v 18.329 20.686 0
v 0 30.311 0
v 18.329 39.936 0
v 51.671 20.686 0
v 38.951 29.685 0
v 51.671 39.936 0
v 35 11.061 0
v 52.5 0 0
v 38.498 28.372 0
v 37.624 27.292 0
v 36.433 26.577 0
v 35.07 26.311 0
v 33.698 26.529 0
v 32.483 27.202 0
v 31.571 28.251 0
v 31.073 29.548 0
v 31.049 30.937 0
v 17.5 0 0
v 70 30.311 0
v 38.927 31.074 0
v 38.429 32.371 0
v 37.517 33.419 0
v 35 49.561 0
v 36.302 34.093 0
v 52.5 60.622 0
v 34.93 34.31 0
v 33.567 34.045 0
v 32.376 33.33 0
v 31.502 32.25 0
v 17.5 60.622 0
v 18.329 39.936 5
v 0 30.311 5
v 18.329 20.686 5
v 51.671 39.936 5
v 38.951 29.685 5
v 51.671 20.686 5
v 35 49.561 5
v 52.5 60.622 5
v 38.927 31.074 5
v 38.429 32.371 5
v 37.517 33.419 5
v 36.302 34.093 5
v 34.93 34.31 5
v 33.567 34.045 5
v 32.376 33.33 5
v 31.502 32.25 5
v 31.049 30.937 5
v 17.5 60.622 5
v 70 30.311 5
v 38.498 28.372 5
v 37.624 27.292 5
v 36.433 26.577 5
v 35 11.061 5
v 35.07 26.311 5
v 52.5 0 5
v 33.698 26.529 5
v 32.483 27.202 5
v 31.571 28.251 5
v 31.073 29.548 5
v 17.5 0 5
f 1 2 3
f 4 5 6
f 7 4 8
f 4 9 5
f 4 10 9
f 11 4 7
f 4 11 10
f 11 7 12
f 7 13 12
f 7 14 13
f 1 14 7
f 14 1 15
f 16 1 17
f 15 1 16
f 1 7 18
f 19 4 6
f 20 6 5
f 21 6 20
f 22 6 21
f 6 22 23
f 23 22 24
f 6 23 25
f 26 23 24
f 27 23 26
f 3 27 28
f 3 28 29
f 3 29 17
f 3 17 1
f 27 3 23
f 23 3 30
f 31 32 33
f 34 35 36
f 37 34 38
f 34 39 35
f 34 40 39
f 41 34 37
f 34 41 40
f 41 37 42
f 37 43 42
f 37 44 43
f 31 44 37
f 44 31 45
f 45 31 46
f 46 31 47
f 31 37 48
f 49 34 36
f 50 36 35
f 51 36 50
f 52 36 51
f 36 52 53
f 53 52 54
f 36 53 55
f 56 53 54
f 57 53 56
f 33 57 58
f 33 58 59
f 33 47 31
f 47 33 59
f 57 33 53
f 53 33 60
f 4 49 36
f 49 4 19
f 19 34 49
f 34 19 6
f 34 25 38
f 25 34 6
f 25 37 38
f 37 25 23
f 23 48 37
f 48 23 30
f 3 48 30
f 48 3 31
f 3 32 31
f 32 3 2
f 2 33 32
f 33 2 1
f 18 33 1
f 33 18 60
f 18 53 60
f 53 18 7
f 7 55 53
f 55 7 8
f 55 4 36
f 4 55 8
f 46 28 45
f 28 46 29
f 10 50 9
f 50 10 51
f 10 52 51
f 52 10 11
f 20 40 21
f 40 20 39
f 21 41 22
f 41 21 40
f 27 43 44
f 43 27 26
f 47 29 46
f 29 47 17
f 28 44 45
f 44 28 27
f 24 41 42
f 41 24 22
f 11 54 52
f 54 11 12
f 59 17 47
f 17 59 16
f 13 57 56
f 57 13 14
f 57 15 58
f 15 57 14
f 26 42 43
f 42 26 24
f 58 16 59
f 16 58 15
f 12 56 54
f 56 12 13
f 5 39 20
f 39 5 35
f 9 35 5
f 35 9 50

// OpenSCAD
$fn = 32;

// ----------------------------------------------------------------------
// Star wheel: 6-point star, R35
// ----------------------------------------------------------------------

// --- parameters (mm) ---
n_points = 6;             // number of points / teeth
r_out = 35;               // tip radius
r_in = 19.25;             // root radius
bore_r = 4;               // centre bore radius
plate_t = 5;              // plate thickness, Z (extrusion height)
bore_d = 8;               // centre bore diameter

profile = [[0, 30.311], [18.329, 20.686], [17.5, 0], [35, 11.061], [52.5, 0], [51.671, 20.686], [70, 30.311], [51.671, 39.936], [52.5, 60.622], [35, 49.561], [17.5, 60.622], [18.329, 39.936]];  // primary outline, 12 points, counter clockwise
void_1 = [[38.927, 31.074], [38.429, 32.371], [37.517, 33.419], [36.302, 34.093], [34.93, 34.31], [33.567, 34.045], [32.376, 33.33], [31.502, 32.25], [31.049, 30.937], [31.073, 29.548], [31.571, 28.251], [32.483, 27.202], [33.698, 26.529], [35.07, 26.311], [36.433, 26.577], [37.624, 27.292], [38.498, 28.372], [38.951, 29.685]];  // centre bore, 18 points

// --- the one profile operation ---
difference() {
  linear_extrude(height = plate_t) polygon(points = profile);
  translate([0, 0, -1])
    linear_extrude(height = plate_t + 2) polygon(points = void_1);
}
